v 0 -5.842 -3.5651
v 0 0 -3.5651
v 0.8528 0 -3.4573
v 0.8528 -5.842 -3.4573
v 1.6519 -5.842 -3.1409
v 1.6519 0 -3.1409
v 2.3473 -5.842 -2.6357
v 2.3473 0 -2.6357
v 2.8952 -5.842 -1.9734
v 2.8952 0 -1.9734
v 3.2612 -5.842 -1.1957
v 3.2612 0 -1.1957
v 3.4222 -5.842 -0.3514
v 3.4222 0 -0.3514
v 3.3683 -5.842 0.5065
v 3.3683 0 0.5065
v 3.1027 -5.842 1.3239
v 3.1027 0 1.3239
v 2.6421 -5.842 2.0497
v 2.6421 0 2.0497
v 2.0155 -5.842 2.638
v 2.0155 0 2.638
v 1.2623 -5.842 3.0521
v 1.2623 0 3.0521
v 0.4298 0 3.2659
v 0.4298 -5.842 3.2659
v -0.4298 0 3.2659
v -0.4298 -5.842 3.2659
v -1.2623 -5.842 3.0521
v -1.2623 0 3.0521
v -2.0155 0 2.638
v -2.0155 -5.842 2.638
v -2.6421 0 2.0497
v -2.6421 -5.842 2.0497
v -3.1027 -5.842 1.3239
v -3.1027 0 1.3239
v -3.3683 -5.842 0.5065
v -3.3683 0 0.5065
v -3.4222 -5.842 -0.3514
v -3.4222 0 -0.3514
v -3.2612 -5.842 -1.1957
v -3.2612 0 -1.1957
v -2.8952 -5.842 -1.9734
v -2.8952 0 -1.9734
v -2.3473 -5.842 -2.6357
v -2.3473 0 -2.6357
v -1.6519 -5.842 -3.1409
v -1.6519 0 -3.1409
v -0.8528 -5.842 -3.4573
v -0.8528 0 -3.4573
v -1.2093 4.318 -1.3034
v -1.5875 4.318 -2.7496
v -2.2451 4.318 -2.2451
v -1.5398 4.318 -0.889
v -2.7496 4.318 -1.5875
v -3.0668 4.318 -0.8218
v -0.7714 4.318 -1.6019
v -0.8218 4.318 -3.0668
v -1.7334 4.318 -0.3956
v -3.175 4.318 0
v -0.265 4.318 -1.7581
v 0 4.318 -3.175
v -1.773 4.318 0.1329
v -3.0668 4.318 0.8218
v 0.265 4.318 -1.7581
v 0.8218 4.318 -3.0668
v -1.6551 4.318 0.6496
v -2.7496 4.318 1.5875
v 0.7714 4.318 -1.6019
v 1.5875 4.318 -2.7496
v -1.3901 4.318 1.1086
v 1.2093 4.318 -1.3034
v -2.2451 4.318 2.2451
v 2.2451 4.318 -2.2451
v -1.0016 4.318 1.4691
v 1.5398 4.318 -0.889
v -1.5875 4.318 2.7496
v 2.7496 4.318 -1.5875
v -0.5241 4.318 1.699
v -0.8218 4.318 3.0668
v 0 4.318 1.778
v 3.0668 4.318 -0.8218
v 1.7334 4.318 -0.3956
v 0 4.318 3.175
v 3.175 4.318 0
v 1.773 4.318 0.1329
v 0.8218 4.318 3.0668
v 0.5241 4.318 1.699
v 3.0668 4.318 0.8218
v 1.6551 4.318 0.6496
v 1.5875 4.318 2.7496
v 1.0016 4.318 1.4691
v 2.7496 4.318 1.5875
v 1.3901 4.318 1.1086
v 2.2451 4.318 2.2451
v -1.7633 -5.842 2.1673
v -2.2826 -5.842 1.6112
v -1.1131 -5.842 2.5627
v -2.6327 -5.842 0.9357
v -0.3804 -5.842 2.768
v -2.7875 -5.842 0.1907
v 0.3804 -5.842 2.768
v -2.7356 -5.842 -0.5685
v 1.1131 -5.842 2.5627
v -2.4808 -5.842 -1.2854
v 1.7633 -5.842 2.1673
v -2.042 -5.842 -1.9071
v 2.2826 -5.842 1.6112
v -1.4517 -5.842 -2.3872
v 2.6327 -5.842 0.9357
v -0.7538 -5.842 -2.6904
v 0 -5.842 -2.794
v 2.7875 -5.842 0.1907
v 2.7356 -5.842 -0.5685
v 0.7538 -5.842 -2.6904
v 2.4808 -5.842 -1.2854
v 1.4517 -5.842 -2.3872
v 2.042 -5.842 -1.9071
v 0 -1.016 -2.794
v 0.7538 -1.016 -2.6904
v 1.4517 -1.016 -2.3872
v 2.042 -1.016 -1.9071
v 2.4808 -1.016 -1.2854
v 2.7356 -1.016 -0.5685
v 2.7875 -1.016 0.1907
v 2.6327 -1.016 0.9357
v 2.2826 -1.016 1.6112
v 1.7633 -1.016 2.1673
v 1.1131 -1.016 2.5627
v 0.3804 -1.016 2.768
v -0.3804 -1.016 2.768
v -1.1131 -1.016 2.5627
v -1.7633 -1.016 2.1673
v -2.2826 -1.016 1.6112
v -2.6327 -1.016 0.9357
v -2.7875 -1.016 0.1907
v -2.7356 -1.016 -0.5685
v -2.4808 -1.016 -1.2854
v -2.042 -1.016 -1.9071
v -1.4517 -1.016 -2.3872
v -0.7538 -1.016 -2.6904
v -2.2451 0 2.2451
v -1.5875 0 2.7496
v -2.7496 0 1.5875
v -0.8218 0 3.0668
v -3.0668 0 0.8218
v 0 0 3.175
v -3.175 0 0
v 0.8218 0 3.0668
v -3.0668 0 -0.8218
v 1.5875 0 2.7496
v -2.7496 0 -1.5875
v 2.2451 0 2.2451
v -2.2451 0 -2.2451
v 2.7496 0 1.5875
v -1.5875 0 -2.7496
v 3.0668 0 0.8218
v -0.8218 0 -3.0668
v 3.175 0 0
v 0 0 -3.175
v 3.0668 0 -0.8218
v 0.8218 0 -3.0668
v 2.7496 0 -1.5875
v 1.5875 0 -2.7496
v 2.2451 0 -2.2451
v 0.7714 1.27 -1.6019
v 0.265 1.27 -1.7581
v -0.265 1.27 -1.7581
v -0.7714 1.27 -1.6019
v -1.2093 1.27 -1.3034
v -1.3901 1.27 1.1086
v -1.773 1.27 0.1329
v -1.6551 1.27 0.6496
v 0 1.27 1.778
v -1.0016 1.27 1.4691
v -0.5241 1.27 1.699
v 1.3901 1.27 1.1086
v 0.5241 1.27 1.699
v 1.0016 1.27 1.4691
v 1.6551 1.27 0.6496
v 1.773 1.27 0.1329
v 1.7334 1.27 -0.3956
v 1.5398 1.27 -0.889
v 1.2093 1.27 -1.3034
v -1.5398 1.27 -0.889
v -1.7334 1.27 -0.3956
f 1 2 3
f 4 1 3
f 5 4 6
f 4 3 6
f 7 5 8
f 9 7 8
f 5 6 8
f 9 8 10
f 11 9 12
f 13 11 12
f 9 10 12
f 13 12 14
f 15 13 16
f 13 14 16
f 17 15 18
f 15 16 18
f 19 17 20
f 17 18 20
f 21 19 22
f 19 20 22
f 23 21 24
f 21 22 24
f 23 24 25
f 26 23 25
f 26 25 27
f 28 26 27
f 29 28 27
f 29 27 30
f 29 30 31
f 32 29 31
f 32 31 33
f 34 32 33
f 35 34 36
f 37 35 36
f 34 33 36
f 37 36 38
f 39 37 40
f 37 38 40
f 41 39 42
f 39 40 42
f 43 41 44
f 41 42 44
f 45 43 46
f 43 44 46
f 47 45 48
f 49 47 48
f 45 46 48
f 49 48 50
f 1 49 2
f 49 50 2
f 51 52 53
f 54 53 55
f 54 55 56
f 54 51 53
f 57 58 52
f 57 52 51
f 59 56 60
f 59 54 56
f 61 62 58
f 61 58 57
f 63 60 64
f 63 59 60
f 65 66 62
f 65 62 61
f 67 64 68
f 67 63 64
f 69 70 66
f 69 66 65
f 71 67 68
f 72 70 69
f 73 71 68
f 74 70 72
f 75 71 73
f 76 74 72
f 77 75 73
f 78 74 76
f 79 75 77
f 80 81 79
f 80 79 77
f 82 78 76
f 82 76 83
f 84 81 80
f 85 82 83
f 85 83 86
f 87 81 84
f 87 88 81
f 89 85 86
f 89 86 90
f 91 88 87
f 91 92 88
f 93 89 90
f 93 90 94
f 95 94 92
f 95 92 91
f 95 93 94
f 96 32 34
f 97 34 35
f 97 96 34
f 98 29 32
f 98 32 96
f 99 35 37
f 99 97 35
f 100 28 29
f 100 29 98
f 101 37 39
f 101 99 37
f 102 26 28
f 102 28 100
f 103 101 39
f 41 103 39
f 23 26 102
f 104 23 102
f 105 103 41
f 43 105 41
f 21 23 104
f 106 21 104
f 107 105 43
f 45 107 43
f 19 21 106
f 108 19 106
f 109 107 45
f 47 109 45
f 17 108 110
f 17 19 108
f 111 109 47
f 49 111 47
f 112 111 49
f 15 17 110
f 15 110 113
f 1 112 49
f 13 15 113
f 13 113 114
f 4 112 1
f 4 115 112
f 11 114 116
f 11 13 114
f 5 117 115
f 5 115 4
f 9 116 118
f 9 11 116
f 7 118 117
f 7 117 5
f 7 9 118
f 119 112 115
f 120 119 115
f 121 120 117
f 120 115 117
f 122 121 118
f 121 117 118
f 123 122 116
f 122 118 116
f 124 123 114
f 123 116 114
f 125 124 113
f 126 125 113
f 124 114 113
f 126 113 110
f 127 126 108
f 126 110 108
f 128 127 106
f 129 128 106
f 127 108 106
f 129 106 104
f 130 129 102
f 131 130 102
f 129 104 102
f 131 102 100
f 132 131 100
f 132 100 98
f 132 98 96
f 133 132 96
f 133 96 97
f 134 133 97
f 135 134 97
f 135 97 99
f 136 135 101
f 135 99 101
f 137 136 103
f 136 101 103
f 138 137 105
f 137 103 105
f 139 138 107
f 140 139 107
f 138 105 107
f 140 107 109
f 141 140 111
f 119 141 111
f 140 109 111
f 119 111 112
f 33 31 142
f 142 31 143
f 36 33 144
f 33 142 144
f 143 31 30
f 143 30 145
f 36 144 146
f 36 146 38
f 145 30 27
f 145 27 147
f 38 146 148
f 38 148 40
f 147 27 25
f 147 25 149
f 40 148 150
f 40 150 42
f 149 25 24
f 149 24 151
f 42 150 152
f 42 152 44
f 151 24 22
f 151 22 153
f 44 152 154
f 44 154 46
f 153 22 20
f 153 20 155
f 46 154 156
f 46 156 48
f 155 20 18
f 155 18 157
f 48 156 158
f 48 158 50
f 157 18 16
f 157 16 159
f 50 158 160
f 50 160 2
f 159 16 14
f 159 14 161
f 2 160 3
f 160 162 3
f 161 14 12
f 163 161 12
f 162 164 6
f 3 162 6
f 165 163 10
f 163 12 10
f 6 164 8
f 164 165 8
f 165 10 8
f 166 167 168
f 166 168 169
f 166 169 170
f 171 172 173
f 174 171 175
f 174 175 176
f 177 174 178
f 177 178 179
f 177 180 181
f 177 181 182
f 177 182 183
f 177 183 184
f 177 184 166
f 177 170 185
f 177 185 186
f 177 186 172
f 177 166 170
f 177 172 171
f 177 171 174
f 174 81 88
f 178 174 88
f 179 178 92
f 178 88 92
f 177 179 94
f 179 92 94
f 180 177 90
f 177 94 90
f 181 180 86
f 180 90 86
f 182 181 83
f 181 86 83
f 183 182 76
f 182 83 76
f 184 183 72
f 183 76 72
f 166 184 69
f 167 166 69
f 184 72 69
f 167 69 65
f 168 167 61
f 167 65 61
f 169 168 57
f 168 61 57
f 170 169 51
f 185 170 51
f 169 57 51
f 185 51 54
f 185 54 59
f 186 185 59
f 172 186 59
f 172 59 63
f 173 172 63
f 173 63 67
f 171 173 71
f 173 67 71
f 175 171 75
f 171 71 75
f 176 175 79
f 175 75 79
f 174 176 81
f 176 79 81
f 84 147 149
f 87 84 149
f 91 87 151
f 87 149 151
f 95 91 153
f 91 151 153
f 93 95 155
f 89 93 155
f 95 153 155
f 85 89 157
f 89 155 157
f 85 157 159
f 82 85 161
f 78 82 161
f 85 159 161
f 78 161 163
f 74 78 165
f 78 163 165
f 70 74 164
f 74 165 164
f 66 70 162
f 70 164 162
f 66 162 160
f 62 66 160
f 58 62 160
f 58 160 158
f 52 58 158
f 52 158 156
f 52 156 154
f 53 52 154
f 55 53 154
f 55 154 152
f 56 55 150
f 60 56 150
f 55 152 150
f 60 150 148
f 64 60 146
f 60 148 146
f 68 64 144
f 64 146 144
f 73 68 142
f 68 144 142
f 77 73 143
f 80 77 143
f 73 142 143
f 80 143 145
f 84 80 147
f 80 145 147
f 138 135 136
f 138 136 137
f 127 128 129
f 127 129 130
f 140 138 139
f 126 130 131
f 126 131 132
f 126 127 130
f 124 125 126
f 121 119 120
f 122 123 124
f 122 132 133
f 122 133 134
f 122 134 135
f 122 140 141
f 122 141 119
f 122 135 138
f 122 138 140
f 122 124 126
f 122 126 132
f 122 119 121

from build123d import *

# Parameters (mm, degrees)
SKETCH1_R           = 3.175
BOSS_EXTRUDE1_DEPTH = 4.318
SKETCH2_R           = 1.778
CUT_EXTRUDE1_DEPTH  = 3.048
SKETCH4_R           = 3.429
BOSS_EXTRUDE2_DEPTH = 5.842
SKETCH5_R           = 2.794
CUT_EXTRUDE2_DEPTH  = 4.826


with BuildPart() as part:
    # Sketch1 → Boss-Extrude1 (new body)
    with BuildSketch(Plane(origin=(0, 0, 0), x_dir=(1, 0, 0), z_dir=(0, 1, 0))):
        with Locations(Location((0, 0, 0), (0, 0, 270))):
            Circle(SKETCH1_R)
    extrude(amount=BOSS_EXTRUDE1_DEPTH)

    # Sketch2 → Cut-Extrude1 (cut)
    with BuildSketch(Plane(origin=(0, 4.318, 0), x_dir=(1, 0, 0), z_dir=(0, 1, 0))):
        with Locations(Location((0, 0, 0), (0, 0, 270))):
            Circle(SKETCH2_R)
    extrude(amount=-CUT_EXTRUDE1_DEPTH, mode=Mode.SUBTRACT)

    # Sketch4 → Boss-Extrude2 (add)
    with BuildSketch(Plane.XZ):
        with Locations(Location((0, -0.136069794, 0), (0, 0, 270))):
            Circle(SKETCH4_R)
    extrude(amount=BOSS_EXTRUDE2_DEPTH)

    # Sketch5 → Cut-Extrude2 (cut)
    with BuildSketch(Plane.XZ.offset(5.842)):
        with Locations(Location((0, 0, 0), (0, 0, 270))):
            Circle(SKETCH5_R)
    extrude(amount=-CUT_EXTRUDE2_DEPTH, mode=Mode.SUBTRACT)


solid = part.part
